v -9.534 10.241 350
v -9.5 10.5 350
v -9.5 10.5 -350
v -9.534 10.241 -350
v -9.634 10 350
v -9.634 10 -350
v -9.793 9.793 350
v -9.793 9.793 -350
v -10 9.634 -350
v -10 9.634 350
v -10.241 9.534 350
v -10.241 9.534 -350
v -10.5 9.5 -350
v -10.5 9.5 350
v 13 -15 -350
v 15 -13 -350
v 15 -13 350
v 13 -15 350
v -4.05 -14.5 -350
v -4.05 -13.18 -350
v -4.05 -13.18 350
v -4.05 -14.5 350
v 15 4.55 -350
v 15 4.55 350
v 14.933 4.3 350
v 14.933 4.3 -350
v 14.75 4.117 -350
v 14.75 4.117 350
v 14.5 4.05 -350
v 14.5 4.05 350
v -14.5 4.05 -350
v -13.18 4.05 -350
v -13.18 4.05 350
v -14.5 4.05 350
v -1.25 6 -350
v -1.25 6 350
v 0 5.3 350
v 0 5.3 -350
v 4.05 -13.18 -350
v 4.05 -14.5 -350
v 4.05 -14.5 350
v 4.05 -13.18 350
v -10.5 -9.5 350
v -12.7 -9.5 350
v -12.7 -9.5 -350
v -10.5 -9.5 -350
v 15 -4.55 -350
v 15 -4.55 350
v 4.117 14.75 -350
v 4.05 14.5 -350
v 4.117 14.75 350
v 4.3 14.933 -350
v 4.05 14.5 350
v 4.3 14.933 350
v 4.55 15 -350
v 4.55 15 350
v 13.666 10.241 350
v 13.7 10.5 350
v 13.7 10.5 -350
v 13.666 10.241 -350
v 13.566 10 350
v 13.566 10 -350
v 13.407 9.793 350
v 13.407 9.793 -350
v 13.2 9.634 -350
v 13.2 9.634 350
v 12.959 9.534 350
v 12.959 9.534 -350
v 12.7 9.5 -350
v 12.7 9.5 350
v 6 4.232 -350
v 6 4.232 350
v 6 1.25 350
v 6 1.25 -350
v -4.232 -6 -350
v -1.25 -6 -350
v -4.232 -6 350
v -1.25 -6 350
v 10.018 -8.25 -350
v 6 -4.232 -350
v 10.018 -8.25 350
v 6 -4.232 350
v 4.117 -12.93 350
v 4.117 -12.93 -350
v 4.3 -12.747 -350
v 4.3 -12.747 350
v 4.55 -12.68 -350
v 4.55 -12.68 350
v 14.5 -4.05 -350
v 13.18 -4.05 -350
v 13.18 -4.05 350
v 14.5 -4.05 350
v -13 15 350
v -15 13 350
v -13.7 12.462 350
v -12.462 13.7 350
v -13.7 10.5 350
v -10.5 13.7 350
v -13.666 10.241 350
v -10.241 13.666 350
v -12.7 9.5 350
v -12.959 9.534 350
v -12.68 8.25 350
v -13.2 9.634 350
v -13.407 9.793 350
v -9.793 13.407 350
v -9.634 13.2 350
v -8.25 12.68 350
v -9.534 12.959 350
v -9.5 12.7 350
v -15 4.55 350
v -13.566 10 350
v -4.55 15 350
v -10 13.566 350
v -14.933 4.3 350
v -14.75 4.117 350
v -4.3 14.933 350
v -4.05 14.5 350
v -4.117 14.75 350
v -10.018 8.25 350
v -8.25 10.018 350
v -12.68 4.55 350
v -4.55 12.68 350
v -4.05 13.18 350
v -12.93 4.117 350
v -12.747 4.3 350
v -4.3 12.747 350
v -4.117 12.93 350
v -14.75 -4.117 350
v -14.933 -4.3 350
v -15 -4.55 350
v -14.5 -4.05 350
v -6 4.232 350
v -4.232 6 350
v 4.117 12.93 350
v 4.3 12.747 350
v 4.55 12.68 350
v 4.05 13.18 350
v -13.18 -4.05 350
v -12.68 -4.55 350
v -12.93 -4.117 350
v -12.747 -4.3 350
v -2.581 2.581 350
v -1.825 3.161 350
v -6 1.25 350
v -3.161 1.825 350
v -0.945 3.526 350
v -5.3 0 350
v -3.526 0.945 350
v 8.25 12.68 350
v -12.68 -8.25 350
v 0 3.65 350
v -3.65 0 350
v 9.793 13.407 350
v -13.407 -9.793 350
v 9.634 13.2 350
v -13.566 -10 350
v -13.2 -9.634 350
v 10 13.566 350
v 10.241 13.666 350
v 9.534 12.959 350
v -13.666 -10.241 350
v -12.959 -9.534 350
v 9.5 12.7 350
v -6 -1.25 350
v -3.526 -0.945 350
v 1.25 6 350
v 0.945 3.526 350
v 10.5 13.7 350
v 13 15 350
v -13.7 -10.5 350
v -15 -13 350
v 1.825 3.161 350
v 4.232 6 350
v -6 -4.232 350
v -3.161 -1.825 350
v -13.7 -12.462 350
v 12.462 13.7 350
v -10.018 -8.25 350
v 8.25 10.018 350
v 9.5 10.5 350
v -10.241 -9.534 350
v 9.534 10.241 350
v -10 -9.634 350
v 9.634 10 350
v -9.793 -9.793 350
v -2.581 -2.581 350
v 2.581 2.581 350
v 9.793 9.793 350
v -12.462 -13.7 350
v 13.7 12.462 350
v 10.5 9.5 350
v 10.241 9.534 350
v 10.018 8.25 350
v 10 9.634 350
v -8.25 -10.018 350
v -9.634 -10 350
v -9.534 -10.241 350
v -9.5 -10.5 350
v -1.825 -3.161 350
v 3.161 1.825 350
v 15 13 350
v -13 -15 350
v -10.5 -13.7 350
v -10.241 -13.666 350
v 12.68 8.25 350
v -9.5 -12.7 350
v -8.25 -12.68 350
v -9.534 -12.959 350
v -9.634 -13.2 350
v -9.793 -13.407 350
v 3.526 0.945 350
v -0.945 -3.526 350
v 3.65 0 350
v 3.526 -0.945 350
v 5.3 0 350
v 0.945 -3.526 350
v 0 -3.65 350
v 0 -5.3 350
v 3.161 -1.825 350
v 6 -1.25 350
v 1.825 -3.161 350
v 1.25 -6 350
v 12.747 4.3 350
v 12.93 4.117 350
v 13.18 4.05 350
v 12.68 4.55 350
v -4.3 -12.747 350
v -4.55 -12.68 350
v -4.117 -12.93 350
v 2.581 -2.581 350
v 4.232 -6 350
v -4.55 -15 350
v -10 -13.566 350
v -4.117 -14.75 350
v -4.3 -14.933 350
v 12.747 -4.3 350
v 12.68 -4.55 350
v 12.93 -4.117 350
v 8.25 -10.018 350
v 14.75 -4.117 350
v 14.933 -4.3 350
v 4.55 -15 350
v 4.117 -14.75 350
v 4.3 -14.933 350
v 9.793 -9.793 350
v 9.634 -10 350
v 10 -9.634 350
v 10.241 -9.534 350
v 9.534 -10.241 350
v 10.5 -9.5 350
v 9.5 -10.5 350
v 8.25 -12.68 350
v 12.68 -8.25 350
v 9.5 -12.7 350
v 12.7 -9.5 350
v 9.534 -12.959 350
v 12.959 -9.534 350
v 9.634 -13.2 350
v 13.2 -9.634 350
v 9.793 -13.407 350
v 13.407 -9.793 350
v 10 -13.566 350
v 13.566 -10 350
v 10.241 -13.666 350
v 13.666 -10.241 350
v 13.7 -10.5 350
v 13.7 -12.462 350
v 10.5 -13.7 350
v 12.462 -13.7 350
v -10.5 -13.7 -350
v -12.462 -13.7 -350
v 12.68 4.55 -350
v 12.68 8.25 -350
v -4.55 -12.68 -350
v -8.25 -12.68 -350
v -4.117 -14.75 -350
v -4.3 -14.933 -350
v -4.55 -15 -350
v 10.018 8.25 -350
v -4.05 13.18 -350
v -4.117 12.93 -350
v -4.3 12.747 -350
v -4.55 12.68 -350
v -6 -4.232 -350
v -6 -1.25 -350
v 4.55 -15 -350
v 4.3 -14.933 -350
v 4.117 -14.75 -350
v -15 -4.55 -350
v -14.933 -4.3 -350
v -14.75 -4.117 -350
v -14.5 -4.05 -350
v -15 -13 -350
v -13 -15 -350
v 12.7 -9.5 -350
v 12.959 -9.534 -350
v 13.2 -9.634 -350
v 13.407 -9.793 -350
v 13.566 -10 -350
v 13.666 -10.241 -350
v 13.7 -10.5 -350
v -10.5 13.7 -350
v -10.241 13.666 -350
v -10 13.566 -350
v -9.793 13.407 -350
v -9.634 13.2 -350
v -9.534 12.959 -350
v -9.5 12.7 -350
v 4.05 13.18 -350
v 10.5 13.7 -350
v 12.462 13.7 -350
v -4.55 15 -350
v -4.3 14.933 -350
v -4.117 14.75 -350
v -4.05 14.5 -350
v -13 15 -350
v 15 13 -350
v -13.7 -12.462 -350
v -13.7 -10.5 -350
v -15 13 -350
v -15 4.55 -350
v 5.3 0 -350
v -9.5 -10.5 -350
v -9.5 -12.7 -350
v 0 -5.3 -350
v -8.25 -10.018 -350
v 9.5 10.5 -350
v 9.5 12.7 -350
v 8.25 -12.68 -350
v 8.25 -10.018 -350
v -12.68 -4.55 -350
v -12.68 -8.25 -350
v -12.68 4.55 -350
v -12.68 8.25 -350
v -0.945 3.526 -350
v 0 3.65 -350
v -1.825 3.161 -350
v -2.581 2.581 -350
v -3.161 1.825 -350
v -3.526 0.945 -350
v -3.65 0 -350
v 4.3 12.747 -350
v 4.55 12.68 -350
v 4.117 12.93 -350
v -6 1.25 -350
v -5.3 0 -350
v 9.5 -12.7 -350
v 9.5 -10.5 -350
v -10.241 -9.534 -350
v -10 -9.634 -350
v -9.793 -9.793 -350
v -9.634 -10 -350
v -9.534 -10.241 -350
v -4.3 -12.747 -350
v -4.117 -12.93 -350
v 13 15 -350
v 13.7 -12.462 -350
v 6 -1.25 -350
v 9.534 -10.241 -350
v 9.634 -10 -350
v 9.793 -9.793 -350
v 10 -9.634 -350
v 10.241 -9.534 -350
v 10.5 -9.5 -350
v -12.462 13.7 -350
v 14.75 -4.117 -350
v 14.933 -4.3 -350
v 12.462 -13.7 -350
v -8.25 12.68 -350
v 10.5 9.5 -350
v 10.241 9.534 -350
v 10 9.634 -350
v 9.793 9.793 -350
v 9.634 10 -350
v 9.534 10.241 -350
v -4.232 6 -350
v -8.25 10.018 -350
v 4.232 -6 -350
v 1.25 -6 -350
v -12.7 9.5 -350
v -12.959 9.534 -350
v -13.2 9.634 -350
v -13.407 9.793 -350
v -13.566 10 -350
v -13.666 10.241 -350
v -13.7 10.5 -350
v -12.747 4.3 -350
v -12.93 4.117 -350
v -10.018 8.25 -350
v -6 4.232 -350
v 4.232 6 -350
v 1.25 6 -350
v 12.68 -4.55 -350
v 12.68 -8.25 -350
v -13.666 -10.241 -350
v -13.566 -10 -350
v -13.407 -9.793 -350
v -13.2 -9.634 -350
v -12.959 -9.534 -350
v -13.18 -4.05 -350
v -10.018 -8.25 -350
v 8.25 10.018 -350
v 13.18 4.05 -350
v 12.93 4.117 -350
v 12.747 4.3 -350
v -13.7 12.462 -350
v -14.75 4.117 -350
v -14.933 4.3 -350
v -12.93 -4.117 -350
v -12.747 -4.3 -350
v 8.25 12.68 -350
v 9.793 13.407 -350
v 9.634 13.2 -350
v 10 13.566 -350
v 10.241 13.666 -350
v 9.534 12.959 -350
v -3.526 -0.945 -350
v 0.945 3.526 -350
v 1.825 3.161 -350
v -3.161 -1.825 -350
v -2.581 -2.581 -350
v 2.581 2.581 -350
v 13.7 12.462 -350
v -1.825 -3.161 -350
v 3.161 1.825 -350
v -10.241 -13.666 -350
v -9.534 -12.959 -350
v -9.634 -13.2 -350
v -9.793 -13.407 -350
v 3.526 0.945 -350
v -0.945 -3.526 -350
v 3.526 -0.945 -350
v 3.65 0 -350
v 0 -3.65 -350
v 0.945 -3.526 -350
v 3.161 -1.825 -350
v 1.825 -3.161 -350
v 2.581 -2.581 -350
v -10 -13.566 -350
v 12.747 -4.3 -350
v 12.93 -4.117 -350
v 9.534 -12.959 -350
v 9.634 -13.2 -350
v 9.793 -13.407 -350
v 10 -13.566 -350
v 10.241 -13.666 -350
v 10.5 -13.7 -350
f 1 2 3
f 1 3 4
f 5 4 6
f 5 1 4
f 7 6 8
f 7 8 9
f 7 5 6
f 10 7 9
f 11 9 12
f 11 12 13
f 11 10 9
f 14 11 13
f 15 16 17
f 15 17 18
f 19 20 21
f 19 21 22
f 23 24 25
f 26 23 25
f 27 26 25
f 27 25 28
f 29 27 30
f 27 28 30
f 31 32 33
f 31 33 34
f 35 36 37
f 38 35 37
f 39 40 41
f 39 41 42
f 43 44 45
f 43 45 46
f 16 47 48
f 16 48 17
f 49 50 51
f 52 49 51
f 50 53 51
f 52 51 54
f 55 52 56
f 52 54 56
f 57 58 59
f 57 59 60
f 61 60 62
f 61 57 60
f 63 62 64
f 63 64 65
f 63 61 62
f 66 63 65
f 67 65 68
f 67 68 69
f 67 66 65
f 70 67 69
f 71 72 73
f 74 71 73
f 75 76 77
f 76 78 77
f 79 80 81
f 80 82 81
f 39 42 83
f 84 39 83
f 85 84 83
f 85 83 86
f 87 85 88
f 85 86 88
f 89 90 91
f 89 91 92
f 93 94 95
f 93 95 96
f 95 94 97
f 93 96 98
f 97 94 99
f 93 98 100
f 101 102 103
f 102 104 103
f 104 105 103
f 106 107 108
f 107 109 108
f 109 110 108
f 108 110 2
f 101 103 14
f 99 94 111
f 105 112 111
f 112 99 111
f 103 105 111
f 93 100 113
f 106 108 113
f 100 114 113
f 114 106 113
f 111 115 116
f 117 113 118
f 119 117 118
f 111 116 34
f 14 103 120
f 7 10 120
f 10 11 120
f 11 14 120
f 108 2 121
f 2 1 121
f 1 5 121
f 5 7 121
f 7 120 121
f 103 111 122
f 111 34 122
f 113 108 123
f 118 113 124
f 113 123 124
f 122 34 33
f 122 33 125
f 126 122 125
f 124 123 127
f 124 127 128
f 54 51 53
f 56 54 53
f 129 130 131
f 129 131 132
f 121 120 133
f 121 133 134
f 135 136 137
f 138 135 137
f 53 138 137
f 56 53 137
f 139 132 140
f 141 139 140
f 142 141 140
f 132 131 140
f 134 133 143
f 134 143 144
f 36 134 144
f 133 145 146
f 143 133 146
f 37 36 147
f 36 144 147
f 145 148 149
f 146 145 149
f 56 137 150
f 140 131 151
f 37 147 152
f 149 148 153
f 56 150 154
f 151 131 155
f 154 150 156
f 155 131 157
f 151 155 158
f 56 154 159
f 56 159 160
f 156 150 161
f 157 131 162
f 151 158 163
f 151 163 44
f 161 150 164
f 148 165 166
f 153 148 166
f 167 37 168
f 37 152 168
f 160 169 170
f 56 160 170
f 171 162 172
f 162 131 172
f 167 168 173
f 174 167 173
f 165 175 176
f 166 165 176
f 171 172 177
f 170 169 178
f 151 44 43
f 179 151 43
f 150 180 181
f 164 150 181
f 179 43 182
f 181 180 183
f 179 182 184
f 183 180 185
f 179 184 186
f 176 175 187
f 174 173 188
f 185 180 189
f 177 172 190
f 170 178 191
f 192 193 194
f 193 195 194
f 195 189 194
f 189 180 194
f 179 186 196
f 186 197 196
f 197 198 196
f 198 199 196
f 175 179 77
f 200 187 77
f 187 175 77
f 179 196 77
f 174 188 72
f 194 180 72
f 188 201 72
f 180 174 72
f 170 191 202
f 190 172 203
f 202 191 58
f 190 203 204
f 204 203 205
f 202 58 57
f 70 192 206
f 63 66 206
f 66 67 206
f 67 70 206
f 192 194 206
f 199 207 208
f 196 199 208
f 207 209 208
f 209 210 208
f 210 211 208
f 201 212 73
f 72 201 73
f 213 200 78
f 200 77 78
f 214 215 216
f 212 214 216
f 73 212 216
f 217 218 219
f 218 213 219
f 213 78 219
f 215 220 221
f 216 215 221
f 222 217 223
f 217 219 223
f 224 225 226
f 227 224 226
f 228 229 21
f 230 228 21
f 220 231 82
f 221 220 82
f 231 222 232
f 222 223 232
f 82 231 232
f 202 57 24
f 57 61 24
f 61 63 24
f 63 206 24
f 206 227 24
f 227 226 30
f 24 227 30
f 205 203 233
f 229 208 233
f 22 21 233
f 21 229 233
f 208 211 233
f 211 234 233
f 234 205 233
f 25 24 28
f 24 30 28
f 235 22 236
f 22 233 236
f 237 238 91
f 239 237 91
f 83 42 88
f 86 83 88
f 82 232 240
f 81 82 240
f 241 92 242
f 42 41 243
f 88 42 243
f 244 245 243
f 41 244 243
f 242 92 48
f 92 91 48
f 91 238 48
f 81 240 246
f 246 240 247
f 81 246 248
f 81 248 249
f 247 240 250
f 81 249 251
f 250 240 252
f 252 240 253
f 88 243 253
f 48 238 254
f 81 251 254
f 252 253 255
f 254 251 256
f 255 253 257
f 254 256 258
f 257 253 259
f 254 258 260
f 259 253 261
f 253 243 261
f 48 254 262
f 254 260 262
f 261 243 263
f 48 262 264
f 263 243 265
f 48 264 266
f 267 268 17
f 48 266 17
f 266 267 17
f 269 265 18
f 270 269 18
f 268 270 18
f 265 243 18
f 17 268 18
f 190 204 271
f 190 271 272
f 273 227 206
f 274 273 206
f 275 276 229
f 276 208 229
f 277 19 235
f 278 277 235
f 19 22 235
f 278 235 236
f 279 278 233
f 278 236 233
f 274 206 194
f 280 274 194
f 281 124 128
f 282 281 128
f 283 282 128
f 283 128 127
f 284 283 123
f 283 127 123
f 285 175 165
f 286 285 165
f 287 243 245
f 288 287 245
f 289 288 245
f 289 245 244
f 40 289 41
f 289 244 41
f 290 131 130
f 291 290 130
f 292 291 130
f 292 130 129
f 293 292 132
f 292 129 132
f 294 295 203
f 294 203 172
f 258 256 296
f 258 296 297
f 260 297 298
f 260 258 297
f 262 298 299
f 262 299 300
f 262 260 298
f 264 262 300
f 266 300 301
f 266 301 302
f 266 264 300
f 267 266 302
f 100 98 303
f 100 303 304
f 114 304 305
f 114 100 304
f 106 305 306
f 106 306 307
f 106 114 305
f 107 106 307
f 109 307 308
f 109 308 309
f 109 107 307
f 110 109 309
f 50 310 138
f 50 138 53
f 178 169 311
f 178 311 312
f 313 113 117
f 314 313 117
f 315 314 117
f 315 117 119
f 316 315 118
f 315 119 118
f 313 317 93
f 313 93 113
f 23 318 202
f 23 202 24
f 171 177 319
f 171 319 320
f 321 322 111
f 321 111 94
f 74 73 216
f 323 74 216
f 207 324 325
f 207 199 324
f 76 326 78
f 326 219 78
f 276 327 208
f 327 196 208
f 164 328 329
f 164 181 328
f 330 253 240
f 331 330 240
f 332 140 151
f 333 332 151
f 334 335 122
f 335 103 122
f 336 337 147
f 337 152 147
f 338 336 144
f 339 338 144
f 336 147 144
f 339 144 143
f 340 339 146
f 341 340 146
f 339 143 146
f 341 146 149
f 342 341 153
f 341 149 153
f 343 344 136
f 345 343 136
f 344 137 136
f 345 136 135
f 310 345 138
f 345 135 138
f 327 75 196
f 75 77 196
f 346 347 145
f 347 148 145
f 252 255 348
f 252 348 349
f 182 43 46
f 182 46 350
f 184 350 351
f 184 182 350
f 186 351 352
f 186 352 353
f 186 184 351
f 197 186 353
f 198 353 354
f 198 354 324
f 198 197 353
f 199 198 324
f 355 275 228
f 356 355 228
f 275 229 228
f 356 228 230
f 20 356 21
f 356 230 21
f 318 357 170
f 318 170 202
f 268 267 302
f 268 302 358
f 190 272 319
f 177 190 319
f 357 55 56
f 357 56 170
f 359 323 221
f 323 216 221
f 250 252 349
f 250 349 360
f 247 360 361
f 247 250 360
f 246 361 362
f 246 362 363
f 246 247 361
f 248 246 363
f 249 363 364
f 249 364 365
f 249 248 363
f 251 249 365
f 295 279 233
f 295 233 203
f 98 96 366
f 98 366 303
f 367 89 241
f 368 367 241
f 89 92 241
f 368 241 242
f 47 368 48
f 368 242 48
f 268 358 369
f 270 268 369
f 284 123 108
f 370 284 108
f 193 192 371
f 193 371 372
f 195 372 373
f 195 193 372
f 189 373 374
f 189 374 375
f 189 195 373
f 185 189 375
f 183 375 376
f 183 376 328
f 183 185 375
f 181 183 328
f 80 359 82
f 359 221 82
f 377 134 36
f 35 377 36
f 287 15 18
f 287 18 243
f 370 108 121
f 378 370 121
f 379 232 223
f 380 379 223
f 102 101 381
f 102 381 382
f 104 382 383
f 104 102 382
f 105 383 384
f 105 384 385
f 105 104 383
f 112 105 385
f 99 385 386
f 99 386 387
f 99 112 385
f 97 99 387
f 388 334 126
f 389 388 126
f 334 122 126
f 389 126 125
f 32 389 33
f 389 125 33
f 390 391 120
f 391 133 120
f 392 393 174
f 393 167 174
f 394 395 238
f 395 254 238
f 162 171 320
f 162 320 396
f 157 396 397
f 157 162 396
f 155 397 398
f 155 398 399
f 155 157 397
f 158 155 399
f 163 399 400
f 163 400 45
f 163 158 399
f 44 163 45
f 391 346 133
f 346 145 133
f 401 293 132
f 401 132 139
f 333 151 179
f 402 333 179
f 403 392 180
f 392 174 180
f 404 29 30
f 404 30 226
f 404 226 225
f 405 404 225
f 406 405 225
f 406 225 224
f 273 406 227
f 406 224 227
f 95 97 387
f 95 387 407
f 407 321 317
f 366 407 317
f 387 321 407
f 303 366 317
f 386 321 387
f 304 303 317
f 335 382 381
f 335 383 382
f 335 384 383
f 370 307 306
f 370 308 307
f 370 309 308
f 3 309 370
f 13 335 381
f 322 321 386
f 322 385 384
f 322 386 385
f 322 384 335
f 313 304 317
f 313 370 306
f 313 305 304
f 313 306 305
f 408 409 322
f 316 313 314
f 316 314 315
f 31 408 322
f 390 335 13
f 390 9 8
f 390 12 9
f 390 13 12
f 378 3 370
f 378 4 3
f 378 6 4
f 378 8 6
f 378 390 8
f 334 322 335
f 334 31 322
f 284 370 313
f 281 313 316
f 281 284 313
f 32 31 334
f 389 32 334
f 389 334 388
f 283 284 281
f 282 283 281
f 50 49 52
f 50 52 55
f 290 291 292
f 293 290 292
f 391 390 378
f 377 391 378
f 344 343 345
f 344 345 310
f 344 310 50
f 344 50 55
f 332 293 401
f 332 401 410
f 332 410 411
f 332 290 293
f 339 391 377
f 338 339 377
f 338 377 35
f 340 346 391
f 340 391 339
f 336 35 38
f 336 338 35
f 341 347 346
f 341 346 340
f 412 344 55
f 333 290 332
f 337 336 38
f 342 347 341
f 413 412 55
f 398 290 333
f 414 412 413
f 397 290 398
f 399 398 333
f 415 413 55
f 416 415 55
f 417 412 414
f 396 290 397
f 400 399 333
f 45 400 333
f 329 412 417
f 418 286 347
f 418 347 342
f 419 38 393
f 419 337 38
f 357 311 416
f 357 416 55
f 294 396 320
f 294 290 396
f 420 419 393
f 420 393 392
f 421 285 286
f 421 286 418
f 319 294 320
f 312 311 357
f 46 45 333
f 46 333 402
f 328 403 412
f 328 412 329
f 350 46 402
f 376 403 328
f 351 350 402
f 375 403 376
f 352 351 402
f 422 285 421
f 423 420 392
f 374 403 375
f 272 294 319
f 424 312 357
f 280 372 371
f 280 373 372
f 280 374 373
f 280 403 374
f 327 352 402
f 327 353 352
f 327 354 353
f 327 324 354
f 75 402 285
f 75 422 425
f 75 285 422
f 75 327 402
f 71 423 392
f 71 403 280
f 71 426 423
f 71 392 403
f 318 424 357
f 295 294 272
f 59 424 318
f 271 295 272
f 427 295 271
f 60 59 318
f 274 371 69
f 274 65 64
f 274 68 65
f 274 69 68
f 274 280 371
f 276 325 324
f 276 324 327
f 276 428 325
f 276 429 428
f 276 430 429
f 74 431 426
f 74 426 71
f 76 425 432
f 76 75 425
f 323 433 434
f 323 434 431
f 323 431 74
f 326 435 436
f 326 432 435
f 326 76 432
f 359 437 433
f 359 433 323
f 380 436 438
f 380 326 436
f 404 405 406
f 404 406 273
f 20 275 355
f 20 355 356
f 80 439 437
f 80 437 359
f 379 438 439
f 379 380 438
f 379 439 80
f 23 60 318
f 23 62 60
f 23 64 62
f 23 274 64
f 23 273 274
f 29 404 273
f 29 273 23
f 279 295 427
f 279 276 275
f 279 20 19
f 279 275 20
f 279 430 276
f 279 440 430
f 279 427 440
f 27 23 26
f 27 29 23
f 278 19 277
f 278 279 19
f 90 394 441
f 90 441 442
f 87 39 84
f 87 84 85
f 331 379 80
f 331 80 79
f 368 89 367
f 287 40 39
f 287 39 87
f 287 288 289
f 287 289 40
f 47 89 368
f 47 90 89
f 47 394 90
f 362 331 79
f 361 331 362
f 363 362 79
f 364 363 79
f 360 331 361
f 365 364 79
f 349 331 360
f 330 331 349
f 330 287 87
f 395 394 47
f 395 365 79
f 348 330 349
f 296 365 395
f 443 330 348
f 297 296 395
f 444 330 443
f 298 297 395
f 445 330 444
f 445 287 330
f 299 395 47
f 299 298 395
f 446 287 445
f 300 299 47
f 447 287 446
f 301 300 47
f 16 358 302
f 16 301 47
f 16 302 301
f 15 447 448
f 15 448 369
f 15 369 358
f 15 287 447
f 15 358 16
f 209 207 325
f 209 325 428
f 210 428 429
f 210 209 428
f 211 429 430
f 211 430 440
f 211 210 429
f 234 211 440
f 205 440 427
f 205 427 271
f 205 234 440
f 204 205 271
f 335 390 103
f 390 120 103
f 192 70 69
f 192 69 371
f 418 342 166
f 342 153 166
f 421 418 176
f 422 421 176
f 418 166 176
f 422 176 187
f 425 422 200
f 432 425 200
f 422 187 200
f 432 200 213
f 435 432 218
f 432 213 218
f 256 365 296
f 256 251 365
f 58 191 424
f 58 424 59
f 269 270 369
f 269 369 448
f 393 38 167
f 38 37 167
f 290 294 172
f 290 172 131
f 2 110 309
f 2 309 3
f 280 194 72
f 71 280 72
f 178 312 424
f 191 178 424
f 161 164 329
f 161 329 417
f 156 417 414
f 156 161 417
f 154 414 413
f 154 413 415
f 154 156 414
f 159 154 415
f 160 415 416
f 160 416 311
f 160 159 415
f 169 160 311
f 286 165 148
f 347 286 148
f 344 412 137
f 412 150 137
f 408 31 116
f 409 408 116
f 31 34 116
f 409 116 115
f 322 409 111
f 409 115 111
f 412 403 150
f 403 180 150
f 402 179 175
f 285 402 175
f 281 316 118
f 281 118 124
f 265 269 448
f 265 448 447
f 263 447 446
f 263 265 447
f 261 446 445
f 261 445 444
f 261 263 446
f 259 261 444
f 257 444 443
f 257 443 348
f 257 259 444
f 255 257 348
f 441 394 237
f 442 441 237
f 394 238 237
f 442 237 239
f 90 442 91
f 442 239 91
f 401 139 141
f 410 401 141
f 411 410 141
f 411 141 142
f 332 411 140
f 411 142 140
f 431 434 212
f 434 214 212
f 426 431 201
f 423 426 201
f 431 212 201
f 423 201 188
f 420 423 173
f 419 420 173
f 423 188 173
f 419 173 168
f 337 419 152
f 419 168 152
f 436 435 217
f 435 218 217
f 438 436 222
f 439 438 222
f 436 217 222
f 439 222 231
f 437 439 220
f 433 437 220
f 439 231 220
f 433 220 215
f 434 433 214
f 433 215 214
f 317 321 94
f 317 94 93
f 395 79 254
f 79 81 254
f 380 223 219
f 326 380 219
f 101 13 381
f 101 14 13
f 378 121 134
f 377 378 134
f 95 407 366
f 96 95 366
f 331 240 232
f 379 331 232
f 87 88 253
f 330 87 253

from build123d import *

# Parameters (mm, degrees)
BOSS_EXTRUDE1_DEPTH = 350
CIRPATTERN1_COUNT   = 4


with BuildPart() as part:
    # Sketch1 → Boss-Extrude1 (new, symmetric)
    with BuildSketch(Plane(origin=(0, 0, 0), x_dir=(0, -1, 0), z_dir=(0, 0, 1))):
        with BuildLine():
            Line((0, 5.3), (0, 3.65))
            ThreePointArc((0, 3.65), (-2.580939751, 2.580939751), (-3.65, 0))
            Line((-3.65, 0), (-5.3, 0))
            Line((-5.3, 0), (-6, 1.25))
            Line((-6, 1.25), (-6, 4.232224593))
            Line((-6, 4.232224593), (-10.01775891, 8.249983504))
            Line((-10.01775891, 8.249983504), (-12.68, 8.249983504))
            Line((-12.68, 8.249983504), (-12.68, 4.549990808))
            ThreePointArc((-12.68, 4.549990808), (-12.826446609, 4.196437418), (-13.18, 4.049990808))
            Line((-13.18, 4.049990808), (-14.5, 4.049990808))
            ThreePointArc((-14.5, 4.049990808), (-14.853553391, 4.196437418), (-15, 4.549990808))
            Line((-15, 4.549990808), (-15, 13))
            Line((-15, 13), (-13, 15))
            Line((-13, 15), (-4.549990808, 15))
            ThreePointArc((-4.549990808, 15), (-4.196437418, 14.853553391), (-4.049990808, 14.5))
            Line((-4.049990808, 14.5), (-4.049990808, 13.18))
            ThreePointArc((-4.049990808, 13.18), (-4.196437418, 12.826446609), (-4.549990808, 12.68))
            Line((-4.549990808, 12.68), (-8.249983504, 12.68))
            Line((-8.249983504, 12.68), (-8.249983504, 10.01775891))
            Line((-8.249983504, 10.01775891), (-4.232224593, 6))
            Line((-4.232224593, 6), (-1.25, 6))
            Line((-1.25, 6), (0, 5.3))
        make_face()
        with BuildLine():
            Line((-10.5, 9.5), (-12.7, 9.5))
            ThreePointArc((-12.7, 9.5), (-13.407106781, 9.792893219), (-13.7, 10.5))
            Line((-13.7, 10.5), (-13.7, 12.461522369))
            Line((-13.7, 12.461522369), (-12.461522369, 13.7))
            Line((-12.461522369, 13.7), (-10.5, 13.7))
            ThreePointArc((-10.5, 13.7), (-9.792893219, 13.407106781), (-9.5, 12.7))
            Line((-9.5, 12.7), (-9.5, 10.5))
            ThreePointArc((-9.5, 10.5), (-9.792893219, 9.792893219), (-10.5, 9.5))
        make_face(mode=Mode.SUBTRACT)
    boss_extrude1 = extrude(amount=BOSS_EXTRUDE1_DEPTH, both=True)

    # CirPattern1: Boss-Extrude1 ×4 about axis
    cirpattern1_axis = Axis((0, 0, 330), (0, 0, -1))
    for i in range(1, CIRPATTERN1_COUNT):
        add(boss_extrude1.rotate(cirpattern1_axis, i * 360 / CIRPATTERN1_COUNT))


solid = part.part
